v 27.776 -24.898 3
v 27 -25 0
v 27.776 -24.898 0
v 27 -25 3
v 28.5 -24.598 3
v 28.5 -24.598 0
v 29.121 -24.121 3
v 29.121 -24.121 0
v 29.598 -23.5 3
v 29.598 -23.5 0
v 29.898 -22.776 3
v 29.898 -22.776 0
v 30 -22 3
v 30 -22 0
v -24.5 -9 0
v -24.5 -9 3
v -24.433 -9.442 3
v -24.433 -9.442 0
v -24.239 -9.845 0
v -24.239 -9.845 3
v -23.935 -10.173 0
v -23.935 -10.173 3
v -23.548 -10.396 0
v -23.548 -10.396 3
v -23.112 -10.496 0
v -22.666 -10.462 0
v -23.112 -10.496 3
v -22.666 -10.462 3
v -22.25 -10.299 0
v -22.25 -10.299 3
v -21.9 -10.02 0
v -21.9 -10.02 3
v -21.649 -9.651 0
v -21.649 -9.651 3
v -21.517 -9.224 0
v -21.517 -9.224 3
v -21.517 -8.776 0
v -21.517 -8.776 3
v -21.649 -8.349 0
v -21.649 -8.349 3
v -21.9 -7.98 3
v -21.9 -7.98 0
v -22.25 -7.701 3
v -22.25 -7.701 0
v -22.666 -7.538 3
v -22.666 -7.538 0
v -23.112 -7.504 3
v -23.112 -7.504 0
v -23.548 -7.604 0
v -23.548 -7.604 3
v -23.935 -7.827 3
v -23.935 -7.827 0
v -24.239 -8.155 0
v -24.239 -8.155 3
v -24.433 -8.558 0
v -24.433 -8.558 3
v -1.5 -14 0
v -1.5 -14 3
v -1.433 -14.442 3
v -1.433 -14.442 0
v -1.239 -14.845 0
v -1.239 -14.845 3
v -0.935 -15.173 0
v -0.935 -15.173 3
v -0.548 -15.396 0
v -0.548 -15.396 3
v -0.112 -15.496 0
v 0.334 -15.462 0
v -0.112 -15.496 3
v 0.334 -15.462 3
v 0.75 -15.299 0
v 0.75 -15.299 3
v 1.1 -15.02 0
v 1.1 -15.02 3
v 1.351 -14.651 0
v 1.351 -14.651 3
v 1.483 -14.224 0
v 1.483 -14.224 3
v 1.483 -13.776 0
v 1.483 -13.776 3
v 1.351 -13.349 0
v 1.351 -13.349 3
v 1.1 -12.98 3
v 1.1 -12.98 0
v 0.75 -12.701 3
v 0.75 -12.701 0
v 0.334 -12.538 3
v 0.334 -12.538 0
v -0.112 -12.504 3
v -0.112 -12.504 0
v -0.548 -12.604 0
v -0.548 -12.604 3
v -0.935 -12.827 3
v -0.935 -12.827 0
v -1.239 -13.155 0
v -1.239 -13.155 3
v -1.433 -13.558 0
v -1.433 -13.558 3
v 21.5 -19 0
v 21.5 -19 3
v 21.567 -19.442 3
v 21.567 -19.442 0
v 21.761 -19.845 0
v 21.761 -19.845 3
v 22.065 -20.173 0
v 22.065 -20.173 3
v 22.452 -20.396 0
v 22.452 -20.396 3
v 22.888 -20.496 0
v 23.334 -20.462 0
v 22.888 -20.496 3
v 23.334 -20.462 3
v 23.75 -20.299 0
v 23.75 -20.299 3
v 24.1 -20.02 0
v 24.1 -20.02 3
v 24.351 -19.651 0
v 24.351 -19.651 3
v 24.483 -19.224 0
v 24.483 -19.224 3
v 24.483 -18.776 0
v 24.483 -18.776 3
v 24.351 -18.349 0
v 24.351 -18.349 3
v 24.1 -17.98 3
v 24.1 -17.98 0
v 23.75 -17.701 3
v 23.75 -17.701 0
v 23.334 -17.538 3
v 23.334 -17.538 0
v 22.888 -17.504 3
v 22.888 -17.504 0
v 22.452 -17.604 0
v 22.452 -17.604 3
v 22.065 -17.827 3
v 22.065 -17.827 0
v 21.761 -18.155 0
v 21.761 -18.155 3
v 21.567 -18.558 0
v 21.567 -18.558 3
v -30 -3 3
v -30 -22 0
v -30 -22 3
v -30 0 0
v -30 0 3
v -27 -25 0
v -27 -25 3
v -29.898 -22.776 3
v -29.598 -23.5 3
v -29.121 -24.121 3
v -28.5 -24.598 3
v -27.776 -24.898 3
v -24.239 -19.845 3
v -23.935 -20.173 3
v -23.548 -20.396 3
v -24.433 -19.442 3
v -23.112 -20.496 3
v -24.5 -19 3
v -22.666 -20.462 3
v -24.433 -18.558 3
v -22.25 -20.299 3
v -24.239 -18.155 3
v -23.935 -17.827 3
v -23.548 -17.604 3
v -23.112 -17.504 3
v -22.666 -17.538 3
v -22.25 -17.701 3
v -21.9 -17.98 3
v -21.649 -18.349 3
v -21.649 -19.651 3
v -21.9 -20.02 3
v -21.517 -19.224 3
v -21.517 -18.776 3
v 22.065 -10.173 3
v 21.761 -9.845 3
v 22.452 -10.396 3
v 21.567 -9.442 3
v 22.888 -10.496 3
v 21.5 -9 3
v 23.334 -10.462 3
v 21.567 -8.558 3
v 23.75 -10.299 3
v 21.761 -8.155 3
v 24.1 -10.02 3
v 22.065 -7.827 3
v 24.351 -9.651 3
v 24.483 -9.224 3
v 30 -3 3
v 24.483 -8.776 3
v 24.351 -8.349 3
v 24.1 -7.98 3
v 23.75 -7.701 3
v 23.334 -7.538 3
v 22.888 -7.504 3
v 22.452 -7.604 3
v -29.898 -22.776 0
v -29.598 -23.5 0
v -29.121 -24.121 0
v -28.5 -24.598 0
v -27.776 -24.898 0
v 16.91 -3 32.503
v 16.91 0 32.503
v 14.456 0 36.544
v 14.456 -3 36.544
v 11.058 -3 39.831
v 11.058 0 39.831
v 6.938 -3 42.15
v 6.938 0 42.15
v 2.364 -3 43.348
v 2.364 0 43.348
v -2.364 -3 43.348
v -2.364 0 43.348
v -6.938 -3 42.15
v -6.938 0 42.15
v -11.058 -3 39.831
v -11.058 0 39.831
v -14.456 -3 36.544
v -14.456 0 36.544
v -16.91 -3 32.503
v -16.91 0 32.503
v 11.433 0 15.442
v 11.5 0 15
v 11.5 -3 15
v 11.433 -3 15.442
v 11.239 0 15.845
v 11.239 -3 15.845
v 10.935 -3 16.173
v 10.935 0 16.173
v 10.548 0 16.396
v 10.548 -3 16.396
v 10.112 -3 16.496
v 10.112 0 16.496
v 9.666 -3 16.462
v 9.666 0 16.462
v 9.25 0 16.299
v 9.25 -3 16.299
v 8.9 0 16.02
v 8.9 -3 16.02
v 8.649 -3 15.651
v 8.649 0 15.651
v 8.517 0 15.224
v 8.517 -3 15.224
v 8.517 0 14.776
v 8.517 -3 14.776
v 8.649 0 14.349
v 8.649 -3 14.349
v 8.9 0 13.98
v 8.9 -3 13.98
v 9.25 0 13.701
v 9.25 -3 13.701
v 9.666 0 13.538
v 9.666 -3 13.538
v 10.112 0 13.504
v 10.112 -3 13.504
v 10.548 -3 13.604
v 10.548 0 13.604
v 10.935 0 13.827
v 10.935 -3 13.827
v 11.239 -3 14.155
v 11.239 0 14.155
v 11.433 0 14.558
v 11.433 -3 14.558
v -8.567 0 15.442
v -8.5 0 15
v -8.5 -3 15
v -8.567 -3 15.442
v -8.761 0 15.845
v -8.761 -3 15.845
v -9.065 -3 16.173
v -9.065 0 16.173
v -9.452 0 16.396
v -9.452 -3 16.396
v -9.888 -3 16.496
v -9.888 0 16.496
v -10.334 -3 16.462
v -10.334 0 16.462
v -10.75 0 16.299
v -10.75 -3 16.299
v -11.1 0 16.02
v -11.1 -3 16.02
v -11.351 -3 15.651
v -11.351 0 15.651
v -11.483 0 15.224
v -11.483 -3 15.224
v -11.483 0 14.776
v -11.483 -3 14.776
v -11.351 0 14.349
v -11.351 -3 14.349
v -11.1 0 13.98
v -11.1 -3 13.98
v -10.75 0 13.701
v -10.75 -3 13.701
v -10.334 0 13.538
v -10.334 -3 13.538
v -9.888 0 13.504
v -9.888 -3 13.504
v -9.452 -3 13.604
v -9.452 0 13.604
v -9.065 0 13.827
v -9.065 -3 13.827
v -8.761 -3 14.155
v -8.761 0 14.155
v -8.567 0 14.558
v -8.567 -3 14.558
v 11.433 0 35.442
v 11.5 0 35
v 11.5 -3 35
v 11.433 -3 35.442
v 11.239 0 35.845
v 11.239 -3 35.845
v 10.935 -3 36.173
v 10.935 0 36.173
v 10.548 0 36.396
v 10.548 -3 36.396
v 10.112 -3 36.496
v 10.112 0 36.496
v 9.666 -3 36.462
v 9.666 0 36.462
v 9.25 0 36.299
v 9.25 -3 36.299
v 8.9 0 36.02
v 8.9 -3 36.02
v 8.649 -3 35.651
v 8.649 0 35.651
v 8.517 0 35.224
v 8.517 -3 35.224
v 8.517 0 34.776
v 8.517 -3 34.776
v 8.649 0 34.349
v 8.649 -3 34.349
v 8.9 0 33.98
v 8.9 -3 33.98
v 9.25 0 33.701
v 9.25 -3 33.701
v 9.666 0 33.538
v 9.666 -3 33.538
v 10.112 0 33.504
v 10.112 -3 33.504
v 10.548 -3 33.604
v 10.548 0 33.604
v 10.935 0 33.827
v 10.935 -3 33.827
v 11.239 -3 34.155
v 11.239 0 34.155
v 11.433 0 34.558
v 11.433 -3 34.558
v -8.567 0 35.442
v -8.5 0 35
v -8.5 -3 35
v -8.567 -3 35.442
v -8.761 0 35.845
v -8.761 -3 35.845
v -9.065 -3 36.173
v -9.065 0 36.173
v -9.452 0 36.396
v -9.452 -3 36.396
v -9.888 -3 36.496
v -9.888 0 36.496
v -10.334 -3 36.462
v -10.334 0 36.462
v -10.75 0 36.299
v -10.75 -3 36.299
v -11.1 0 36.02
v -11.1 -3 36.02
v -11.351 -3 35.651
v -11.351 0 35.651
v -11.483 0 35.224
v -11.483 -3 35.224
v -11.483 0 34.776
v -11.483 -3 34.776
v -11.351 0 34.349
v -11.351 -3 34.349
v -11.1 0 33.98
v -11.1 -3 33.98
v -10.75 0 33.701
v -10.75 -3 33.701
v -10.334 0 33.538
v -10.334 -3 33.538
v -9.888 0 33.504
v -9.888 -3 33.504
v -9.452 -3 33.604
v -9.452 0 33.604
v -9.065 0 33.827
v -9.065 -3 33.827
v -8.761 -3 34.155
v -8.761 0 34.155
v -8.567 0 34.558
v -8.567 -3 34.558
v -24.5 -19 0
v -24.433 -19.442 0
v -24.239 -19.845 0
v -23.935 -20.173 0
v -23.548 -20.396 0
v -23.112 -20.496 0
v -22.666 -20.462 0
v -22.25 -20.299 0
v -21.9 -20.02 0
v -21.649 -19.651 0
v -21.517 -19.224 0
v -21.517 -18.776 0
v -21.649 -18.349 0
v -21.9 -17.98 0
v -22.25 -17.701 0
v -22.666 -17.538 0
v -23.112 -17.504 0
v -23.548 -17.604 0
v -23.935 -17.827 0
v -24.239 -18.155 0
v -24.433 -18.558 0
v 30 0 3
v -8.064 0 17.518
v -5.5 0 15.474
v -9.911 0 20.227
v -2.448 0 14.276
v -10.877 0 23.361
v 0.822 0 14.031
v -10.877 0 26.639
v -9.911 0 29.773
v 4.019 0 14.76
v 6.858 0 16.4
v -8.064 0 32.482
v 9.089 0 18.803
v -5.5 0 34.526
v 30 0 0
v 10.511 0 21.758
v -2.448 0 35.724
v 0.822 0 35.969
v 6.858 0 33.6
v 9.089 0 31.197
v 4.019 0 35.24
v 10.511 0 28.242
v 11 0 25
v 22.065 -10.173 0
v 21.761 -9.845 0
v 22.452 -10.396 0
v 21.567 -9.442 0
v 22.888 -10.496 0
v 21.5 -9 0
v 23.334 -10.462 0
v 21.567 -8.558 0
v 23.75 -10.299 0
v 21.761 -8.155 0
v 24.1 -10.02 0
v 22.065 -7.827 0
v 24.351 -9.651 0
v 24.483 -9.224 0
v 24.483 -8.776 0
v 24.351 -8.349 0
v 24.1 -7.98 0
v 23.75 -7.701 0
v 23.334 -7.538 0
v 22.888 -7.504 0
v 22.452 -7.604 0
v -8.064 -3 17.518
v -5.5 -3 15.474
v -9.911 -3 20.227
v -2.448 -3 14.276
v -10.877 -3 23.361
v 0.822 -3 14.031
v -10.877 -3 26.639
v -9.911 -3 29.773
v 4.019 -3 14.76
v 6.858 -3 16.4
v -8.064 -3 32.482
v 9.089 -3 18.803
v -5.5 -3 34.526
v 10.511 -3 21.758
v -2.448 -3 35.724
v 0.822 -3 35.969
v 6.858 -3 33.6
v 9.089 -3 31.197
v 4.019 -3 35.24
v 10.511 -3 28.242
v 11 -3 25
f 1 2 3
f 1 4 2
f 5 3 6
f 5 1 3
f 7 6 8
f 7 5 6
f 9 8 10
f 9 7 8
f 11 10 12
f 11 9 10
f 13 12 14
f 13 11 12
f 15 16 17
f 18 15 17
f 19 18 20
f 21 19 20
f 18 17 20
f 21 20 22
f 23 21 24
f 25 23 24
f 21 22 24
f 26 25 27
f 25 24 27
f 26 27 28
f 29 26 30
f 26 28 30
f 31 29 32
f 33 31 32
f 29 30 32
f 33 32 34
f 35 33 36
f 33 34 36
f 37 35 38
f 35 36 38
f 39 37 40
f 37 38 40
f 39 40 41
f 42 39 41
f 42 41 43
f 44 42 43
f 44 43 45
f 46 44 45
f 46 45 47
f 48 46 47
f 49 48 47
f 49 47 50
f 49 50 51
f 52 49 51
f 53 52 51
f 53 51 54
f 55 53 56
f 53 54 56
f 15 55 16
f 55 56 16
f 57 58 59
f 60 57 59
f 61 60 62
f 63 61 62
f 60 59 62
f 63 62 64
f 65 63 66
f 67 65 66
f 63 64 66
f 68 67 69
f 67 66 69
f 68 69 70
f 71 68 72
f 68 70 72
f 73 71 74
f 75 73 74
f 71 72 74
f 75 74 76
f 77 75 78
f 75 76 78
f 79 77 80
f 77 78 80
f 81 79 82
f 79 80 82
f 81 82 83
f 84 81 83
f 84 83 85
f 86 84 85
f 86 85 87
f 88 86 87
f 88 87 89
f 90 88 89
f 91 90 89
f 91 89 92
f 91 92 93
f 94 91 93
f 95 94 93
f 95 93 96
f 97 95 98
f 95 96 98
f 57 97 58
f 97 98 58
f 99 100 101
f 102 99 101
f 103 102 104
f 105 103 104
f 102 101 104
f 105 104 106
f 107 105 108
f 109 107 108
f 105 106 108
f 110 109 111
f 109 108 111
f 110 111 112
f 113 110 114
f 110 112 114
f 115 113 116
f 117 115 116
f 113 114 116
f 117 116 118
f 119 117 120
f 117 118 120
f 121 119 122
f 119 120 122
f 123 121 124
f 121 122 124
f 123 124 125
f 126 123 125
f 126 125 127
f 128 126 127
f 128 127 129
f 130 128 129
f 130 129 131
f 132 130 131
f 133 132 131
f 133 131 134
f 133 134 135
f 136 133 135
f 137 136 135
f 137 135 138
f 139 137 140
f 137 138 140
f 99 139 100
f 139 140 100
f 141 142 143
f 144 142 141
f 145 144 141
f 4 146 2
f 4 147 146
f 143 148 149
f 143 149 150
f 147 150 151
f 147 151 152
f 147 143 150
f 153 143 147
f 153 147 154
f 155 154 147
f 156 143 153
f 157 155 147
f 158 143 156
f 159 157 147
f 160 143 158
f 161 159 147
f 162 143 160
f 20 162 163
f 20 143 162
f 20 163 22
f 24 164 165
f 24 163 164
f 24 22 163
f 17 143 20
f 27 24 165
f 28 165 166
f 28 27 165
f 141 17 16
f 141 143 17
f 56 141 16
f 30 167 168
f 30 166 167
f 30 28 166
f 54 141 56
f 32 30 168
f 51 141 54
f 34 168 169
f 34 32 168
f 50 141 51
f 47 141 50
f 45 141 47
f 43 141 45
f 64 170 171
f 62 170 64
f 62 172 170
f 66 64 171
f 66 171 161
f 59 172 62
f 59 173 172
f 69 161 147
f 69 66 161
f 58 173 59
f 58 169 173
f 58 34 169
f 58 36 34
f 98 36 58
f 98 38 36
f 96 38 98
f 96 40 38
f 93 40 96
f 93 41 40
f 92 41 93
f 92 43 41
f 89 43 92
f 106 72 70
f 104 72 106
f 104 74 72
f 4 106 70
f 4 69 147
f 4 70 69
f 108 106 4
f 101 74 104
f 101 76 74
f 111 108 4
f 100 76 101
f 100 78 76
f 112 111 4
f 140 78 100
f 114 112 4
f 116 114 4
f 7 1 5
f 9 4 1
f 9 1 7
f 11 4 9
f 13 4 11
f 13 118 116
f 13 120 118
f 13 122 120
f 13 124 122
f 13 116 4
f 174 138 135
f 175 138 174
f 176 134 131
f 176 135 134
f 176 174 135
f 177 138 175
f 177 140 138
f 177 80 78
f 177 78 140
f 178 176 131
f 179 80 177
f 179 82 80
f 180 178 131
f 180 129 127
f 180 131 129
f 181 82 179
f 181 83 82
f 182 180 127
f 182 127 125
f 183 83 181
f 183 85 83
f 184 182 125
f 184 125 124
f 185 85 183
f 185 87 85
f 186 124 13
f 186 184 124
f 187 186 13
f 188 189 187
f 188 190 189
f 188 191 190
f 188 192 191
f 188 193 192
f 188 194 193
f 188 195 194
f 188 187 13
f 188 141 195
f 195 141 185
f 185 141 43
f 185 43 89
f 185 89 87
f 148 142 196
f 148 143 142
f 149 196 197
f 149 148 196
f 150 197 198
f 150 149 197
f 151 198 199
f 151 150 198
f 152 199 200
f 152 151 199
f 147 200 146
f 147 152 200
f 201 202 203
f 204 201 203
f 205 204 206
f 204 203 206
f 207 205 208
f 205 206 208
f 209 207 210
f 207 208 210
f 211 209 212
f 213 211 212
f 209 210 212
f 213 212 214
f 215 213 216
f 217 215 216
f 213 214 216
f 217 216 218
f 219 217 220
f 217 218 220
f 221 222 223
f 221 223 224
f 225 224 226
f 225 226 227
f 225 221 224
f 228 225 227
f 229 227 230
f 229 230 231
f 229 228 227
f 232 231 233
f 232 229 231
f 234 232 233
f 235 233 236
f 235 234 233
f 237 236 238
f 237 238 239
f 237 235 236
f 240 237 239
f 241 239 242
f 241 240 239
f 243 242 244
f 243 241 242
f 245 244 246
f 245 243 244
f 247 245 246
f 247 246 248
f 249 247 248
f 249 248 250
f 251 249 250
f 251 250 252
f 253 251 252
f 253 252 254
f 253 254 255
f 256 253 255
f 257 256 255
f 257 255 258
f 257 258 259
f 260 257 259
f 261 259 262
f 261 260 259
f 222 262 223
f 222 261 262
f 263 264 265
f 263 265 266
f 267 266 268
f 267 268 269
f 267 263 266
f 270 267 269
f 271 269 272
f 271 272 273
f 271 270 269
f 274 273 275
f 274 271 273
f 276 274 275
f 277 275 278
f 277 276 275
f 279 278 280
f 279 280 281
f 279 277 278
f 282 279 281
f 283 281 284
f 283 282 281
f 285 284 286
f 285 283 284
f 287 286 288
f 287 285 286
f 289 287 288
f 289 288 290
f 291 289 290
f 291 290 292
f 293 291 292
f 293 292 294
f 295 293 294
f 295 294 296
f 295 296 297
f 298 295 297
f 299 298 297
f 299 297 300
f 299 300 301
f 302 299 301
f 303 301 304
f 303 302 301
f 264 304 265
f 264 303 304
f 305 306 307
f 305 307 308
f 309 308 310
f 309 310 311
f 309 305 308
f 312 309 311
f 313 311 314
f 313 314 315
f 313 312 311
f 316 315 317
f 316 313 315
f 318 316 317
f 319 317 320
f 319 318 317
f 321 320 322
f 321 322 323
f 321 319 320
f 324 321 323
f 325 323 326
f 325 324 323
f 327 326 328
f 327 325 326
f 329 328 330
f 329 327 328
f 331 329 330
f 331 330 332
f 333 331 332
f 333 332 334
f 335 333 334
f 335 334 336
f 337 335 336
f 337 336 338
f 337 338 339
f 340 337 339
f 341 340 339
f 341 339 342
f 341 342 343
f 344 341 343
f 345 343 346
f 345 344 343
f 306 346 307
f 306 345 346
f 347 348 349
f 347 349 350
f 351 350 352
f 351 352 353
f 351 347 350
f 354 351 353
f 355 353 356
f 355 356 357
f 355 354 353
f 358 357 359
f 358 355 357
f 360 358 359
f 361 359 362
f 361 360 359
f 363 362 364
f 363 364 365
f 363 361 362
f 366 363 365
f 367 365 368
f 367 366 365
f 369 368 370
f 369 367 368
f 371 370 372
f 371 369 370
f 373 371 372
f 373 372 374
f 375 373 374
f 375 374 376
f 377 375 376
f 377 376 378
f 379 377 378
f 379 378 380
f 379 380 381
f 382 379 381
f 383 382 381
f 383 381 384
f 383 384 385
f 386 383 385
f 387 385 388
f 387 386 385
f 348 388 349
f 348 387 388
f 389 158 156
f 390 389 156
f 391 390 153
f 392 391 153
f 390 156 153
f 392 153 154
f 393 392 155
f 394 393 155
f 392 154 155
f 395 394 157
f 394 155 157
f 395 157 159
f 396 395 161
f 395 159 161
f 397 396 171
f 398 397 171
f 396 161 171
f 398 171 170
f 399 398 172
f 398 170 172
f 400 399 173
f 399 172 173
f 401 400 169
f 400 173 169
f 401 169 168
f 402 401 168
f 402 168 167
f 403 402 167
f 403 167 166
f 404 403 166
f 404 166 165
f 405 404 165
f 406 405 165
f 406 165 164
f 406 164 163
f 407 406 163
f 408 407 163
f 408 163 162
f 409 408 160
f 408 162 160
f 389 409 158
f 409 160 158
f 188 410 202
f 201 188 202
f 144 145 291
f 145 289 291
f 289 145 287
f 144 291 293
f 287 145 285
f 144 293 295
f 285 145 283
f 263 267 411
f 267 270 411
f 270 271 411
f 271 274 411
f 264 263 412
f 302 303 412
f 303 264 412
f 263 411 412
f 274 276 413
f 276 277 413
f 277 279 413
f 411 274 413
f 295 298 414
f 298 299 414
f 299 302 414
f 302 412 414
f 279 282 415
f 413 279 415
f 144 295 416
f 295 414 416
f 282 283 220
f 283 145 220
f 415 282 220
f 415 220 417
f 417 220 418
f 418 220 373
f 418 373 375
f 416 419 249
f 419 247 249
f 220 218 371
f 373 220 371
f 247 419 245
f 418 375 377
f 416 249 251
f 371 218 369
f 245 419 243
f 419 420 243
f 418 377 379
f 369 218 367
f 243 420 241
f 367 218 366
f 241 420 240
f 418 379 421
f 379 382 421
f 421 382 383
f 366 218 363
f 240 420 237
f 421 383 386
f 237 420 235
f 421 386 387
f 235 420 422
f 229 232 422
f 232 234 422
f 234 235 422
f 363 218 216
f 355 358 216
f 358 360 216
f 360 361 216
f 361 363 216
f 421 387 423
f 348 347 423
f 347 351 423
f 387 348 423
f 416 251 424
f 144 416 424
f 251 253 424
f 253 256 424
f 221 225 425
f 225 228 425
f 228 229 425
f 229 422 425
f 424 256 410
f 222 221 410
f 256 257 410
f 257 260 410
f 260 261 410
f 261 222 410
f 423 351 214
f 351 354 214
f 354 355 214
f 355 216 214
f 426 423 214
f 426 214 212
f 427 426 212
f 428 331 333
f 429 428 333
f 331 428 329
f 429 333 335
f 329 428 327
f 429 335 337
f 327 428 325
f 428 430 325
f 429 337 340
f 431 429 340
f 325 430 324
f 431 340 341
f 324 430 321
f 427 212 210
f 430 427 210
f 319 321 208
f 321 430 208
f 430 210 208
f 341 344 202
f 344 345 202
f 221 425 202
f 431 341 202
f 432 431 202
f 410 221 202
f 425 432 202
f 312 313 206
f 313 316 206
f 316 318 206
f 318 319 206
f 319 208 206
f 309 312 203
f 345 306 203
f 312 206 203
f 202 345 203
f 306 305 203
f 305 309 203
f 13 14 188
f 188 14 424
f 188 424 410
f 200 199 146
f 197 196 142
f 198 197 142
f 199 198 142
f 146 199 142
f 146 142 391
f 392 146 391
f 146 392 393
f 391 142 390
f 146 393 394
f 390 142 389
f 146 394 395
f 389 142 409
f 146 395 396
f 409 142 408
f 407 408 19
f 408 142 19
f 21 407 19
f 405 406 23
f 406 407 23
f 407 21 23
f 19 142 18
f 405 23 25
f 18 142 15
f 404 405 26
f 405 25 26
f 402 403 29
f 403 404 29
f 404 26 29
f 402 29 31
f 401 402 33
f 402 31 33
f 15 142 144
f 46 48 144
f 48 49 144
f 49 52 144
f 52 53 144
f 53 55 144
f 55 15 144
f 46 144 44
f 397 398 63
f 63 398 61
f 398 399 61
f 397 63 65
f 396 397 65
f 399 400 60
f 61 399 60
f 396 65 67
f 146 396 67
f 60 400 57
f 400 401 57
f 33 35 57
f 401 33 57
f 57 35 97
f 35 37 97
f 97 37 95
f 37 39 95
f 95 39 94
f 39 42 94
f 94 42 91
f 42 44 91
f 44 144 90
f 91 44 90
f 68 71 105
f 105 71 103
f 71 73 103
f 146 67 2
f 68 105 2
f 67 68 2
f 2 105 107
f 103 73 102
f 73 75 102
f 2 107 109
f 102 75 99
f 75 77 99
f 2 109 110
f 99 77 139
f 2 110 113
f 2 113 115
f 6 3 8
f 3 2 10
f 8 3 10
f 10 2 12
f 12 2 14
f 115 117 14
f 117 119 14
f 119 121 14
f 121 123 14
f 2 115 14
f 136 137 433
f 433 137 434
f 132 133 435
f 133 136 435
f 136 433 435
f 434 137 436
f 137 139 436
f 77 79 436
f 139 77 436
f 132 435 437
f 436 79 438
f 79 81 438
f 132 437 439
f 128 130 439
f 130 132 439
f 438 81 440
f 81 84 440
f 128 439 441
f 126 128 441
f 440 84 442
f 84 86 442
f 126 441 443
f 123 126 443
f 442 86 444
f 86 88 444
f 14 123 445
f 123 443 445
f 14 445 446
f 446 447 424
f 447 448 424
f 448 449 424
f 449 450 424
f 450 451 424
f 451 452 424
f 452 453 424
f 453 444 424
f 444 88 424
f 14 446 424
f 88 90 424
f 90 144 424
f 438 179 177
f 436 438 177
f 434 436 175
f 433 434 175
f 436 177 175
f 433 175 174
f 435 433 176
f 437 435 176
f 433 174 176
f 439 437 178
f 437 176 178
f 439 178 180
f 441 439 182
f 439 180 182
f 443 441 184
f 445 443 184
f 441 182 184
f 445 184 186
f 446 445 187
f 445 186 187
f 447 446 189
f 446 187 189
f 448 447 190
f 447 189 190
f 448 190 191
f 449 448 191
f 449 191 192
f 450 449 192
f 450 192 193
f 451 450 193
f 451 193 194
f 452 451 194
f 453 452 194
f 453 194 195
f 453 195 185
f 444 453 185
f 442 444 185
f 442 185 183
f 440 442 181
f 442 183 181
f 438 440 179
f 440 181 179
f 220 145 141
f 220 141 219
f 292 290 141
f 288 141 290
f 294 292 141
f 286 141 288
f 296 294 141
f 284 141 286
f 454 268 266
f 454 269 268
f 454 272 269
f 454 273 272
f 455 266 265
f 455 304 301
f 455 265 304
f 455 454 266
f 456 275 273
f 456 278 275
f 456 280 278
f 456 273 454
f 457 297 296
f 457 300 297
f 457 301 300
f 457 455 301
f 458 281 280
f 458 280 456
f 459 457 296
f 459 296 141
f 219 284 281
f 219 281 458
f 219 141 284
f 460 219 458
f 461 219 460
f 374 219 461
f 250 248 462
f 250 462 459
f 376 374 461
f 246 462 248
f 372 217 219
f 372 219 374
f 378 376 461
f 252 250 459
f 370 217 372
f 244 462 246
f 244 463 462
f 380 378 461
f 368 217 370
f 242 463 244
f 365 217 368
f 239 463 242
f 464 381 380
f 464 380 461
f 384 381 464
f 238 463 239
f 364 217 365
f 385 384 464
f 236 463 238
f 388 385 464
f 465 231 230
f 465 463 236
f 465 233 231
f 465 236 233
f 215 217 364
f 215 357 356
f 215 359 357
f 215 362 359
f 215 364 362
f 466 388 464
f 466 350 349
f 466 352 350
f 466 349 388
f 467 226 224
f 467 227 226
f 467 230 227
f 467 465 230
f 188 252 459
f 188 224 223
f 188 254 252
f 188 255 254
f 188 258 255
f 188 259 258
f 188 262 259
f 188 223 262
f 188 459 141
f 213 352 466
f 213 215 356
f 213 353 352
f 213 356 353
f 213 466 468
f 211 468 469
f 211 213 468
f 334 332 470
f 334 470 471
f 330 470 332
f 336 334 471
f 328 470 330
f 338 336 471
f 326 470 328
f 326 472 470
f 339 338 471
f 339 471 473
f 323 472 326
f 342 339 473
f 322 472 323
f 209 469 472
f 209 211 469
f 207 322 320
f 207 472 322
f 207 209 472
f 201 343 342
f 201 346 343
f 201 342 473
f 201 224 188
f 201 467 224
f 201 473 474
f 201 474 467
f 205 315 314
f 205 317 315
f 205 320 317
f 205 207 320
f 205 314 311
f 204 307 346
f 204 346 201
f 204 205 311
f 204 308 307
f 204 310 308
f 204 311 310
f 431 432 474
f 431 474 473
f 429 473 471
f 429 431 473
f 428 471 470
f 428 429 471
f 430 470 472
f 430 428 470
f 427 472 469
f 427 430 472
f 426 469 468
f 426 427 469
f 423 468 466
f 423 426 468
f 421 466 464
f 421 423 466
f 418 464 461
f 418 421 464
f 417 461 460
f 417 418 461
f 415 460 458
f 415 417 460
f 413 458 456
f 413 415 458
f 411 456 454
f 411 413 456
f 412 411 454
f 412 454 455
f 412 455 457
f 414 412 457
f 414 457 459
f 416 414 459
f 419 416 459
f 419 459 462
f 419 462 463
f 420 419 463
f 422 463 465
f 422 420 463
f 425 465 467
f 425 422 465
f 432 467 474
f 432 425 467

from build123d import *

# Parameters (mm, degrees)
SKETCH_R     = 1.5
SKETCH_R_2   = 11
PAD_DEPTH    = 3
SKETCH003_W  = 60
SKETCH003_H  = 3
PAD001_DEPTH = 22
SKETCH002_R  = 1.5
POCKET_DEPTH = 3
FILLET_R     = 3


with BuildPart() as part:
    # Sketch → Pad (new body)
    with BuildSketch(Plane.XZ):
        with BuildLine():
            ThreePointArc((16.910328, 32.50272), (0, 43.5), (-16.910328, 32.50272))
            Line((-30, 3), (-16.910328, 32.50272))
            Line((-30, 0), (-30, 3))
            Line((-30, 0), (30, 0))
            Line((30, 0), (30, 3))
            Line((30, 3), (16.910328, 32.50272))
        make_face()
        with Locations((10, 15)):
            Circle(SKETCH_R, mode=Mode.SUBTRACT)
        with Locations((10, 35)):
            Circle(SKETCH_R, mode=Mode.SUBTRACT)
        with Locations((-10, 35)):
            Circle(SKETCH_R, mode=Mode.SUBTRACT)
        with Locations((-10, 15)):
            Circle(SKETCH_R, mode=Mode.SUBTRACT)
        with Locations((0, 25)):
            Circle(SKETCH_R_2, mode=Mode.SUBTRACT)
    extrude(amount=PAD_DEPTH)

    # Sketch003 (on Face13 of Pad) → Pad001 (join)
    with BuildSketch(Plane.XZ.offset(3)):
        with Locations((0, 1.5)):
            Rectangle(SKETCH003_W, SKETCH003_H)
    extrude(amount=PAD001_DEPTH)

    # Sketch002 → Pocket (cut)
    with BuildSketch(Plane(origin=(0, 0, 3), x_dir=(-1, 0, 0), z_dir=(0, 0, 1))):
        with Locations((23, 19)):
            Circle(SKETCH002_R)
        with Locations((23, 9)):
            Circle(SKETCH002_R)
        with Locations((-23, 19)):
            Circle(SKETCH002_R)
        with Locations((-23, 9)):
            Circle(SKETCH002_R)
        with Locations((0, 14)):
            Circle(SKETCH002_R)
    extrude(amount=-POCKET_DEPTH, mode=Mode.SUBTRACT)

    # Fillet
    fillet_edges = [part.edges().sort_by_distance(p)[0] for p in [
        (30, -25, 1.5),
        (-30, -25, 1.5),
    ]]
    fillet(fillet_edges, radius=FILLET_R)


solid = part.part
